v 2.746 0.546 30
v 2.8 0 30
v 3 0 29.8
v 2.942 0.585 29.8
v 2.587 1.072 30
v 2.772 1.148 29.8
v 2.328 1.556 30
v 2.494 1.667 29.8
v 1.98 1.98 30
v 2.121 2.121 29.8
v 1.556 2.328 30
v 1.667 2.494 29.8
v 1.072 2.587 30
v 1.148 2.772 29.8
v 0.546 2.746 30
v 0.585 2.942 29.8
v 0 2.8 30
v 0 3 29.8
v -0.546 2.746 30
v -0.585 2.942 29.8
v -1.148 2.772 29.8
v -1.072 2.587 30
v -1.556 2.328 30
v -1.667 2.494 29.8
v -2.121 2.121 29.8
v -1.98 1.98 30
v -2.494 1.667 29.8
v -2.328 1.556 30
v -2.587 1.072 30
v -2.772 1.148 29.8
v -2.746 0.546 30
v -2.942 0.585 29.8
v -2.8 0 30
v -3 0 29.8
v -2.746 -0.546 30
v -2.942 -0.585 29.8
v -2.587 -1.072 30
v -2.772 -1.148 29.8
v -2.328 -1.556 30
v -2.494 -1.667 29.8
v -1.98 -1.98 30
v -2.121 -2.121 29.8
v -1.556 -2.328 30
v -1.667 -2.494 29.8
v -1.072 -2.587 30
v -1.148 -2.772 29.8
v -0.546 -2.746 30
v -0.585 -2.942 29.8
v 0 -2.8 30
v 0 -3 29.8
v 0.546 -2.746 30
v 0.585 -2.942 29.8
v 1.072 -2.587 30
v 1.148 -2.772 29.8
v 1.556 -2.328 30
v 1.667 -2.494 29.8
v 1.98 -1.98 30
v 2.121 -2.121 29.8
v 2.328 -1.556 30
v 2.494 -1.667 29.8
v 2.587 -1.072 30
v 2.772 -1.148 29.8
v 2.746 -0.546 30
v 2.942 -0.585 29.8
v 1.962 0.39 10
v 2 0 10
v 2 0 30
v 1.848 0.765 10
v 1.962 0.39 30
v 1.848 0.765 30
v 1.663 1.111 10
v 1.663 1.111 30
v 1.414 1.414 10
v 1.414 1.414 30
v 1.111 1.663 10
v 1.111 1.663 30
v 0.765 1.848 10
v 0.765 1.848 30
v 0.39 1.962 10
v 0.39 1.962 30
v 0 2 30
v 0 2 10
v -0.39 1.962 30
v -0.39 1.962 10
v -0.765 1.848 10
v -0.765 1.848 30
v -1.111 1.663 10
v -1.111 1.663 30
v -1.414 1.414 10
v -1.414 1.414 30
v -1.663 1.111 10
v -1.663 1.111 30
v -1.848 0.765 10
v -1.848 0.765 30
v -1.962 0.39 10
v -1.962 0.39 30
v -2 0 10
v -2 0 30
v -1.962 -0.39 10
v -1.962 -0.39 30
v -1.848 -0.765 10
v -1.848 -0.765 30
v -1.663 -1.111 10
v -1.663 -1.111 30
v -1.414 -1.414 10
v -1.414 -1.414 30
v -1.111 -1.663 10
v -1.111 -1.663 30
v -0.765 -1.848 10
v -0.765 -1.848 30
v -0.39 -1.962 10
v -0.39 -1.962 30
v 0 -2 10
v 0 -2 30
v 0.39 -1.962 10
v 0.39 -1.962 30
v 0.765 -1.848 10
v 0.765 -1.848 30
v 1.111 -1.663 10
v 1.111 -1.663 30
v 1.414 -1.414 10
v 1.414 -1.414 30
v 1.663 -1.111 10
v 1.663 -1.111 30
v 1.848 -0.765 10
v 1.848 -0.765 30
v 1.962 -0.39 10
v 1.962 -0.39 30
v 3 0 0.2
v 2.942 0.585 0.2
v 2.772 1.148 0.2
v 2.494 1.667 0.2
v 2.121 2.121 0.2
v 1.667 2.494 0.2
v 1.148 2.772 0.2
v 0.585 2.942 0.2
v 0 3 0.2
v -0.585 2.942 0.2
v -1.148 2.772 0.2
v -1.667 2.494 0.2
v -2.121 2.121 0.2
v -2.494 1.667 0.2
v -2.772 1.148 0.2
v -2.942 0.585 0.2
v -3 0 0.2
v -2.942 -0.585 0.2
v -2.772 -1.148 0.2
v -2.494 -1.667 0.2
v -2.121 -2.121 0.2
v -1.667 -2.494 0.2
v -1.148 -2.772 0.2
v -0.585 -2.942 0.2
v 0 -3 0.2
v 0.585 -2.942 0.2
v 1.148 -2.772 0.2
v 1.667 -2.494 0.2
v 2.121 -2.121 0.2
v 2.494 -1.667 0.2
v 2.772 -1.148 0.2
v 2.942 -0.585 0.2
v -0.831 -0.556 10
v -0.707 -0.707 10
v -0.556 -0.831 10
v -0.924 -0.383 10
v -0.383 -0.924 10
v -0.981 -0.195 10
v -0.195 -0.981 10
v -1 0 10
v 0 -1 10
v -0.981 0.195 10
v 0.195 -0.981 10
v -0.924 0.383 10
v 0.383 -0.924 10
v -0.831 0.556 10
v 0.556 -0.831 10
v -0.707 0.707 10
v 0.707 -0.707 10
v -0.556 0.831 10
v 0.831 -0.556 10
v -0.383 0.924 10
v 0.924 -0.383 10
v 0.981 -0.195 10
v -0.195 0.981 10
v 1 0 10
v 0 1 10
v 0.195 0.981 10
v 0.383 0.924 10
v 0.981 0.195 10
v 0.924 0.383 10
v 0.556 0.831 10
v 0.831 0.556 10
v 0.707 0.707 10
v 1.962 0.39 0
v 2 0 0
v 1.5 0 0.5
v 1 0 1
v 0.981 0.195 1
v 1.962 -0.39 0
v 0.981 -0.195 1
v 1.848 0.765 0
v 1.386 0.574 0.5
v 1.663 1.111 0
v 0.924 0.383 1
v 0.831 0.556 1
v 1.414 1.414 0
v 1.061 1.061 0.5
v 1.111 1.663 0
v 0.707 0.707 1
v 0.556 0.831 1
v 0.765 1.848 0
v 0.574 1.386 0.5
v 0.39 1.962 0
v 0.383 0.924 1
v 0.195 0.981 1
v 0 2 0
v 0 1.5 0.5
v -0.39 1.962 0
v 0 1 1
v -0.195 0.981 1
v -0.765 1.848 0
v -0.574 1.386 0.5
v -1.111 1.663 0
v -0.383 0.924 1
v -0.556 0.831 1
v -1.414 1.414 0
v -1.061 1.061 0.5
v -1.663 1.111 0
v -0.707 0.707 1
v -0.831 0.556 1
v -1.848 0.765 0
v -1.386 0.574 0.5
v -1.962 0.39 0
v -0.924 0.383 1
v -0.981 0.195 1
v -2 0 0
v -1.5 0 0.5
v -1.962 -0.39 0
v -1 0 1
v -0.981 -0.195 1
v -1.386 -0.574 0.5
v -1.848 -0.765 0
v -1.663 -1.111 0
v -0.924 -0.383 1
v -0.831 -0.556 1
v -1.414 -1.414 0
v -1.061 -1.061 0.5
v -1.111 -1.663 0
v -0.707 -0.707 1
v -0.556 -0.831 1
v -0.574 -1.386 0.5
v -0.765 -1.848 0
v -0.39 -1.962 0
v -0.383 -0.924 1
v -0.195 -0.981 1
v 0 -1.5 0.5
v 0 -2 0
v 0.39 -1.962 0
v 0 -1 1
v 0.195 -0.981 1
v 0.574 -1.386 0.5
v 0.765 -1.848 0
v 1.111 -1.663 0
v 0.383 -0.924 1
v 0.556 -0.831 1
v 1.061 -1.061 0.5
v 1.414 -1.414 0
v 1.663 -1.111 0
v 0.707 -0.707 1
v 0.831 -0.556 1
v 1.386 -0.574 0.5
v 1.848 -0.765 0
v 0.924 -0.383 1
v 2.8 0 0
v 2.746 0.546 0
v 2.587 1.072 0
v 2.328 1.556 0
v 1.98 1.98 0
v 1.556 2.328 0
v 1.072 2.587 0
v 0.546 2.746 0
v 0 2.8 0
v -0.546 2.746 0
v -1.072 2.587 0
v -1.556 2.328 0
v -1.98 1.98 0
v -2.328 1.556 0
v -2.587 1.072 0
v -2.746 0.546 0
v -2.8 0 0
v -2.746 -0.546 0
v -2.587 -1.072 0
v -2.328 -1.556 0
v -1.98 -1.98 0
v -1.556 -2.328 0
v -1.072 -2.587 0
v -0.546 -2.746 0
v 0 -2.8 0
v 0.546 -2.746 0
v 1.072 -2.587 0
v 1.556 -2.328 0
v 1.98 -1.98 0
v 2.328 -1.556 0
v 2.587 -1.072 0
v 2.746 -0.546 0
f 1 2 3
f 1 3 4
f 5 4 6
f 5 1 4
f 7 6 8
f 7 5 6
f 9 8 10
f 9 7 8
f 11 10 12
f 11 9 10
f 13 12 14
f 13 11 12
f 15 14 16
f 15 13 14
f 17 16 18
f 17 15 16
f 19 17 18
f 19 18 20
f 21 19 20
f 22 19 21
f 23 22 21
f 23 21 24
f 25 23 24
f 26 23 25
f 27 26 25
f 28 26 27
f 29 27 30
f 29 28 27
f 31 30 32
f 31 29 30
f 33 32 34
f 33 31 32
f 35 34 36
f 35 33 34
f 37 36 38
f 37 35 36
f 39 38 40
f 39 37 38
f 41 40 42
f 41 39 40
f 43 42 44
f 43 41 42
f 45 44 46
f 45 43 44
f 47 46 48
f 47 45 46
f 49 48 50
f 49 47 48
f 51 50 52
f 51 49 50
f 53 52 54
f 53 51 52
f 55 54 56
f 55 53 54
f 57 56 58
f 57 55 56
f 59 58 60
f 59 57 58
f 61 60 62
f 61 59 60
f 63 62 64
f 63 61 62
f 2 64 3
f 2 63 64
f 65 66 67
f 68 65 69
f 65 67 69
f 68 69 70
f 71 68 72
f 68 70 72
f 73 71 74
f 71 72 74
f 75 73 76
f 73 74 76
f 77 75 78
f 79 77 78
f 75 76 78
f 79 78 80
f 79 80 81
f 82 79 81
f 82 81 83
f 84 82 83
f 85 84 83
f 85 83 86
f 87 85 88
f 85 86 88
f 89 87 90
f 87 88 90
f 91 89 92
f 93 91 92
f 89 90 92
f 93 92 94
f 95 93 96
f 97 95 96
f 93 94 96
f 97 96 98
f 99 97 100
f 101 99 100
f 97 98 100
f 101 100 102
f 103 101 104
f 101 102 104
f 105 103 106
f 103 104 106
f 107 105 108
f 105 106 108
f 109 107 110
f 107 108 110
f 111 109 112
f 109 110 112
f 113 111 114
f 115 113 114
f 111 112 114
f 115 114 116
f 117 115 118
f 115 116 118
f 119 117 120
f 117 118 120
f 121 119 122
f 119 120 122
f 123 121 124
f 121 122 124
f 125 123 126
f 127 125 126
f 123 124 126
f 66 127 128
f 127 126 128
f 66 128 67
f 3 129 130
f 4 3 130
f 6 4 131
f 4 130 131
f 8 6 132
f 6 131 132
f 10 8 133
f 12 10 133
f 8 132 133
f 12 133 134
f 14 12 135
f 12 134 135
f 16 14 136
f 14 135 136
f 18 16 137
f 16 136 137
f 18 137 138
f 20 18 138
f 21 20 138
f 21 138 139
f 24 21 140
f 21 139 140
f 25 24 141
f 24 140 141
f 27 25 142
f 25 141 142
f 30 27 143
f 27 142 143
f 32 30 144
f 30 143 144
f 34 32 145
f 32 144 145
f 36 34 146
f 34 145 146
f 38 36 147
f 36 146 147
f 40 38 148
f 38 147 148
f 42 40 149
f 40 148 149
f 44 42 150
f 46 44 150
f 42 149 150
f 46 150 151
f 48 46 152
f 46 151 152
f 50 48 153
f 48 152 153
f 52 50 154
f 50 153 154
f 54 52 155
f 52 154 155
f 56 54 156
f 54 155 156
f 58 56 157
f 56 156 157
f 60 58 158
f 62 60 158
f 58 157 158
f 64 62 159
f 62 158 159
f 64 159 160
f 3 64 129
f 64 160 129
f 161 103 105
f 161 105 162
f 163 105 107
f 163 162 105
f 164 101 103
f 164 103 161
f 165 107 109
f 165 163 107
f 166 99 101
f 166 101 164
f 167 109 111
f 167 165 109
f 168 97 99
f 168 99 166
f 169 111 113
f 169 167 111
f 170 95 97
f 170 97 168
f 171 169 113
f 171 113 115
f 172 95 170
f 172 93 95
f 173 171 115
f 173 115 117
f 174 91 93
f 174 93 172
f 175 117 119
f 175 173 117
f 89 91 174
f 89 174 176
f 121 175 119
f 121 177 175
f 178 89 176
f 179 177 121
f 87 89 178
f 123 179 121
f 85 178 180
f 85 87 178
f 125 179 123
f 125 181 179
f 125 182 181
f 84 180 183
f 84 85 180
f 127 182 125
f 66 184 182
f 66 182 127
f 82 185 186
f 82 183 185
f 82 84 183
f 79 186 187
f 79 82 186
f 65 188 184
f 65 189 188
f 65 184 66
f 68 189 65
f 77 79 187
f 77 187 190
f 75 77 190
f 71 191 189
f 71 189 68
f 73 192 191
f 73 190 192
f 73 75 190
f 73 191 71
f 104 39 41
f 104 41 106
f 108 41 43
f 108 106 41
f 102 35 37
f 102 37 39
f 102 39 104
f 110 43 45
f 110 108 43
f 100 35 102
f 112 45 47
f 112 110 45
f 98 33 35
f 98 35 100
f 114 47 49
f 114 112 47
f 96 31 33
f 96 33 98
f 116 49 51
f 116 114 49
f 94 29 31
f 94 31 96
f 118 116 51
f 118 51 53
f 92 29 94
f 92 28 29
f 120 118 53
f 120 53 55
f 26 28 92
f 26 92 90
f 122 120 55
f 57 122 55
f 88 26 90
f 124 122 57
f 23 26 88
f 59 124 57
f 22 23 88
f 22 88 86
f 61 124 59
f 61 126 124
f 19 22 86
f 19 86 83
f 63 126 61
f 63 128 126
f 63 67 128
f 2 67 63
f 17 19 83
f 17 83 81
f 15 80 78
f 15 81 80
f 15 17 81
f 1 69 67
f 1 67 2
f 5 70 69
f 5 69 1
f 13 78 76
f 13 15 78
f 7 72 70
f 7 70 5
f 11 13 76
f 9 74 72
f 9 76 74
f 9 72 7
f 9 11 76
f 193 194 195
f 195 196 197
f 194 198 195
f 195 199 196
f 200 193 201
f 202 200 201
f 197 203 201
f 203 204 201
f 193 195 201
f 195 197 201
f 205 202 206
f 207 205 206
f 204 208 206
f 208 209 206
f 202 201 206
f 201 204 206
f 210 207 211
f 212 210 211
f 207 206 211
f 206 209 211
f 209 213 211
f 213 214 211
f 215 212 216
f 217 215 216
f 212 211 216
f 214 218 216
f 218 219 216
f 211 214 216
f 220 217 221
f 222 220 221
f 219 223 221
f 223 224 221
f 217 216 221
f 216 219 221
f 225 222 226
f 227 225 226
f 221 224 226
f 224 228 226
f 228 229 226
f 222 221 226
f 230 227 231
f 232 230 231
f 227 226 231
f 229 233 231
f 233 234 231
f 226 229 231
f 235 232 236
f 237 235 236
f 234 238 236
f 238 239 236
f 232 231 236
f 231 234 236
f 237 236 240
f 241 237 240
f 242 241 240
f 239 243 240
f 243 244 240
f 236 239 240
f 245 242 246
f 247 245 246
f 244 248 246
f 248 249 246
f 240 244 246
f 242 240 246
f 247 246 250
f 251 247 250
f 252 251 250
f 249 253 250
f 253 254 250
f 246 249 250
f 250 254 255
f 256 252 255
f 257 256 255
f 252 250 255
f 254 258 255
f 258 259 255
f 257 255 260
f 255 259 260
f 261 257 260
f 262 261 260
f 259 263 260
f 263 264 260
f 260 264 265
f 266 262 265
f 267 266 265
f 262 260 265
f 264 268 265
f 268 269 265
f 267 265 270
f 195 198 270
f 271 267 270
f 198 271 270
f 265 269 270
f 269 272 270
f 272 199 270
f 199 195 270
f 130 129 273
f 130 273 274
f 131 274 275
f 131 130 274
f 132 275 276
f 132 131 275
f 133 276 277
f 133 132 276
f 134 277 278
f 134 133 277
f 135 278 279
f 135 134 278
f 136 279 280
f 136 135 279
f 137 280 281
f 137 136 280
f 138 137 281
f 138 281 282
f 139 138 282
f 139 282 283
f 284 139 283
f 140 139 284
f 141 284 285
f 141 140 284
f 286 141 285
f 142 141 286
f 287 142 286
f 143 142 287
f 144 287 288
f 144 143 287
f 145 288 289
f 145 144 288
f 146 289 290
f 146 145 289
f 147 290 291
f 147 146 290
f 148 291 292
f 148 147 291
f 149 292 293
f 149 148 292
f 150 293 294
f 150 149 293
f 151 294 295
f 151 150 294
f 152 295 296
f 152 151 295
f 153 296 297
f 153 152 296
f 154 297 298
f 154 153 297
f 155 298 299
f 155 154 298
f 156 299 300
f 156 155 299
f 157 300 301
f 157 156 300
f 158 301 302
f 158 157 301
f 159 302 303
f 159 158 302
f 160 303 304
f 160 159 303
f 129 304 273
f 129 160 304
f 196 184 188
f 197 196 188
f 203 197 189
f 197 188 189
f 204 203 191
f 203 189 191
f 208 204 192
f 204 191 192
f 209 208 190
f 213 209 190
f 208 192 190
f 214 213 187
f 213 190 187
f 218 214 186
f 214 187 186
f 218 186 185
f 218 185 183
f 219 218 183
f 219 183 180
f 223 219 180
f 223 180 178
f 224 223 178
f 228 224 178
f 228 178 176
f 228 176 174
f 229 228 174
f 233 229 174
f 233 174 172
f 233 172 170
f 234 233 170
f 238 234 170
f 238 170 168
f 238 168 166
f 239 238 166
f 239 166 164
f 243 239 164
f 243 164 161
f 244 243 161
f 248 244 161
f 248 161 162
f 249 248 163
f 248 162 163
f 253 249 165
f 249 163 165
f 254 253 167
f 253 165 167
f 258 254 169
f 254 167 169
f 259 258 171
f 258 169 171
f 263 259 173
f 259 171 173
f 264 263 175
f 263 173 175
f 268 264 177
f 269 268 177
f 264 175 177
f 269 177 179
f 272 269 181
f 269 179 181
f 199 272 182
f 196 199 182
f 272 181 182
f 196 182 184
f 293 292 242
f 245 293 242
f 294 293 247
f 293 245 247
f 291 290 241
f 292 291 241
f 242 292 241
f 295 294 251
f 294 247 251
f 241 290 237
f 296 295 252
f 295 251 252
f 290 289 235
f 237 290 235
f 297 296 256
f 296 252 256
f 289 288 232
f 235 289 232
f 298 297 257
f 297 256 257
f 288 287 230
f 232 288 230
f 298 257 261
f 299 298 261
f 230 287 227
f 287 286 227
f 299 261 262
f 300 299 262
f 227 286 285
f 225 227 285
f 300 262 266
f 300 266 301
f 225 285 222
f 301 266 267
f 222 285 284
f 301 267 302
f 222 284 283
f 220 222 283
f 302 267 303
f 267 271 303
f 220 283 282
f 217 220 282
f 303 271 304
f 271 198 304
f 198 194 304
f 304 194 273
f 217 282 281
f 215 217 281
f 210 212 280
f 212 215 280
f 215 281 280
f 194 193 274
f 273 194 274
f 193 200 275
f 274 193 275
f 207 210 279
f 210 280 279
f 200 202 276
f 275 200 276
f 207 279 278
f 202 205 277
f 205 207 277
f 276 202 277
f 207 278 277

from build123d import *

# Parameters (mm, degrees)
SKETCH_1_R          = 3
EXTRUDE_1_DEPTH     = 30
SKETCH_2_R          = 1
CUT_EXTRUDE_1_DEPTH = 30
SKETCH_3_R          = 2
CUT_EXTRUDE_2_DEPTH = 20
CHAMFER_1_SIZE      = 1
CHAMFER_2_SIZE      = 0.2


with BuildPart() as part:
    # Эскиз1 → Бобышка-Вытянуть1 (new body)
    with BuildSketch(Plane.XY):
        Circle(SKETCH_1_R)
    extrude(amount=EXTRUDE_1_DEPTH)

    # Эскиз2 → Вырез-Вытянуть1 (cut)
    with BuildSketch(Plane.XY.offset(30)):
        Circle(SKETCH_2_R)
    extrude(amount=-CUT_EXTRUDE_1_DEPTH, mode=Mode.SUBTRACT)

    # Эскиз3 → Вырез-Вытянуть2 (cut)
    with BuildSketch(Plane.XY.offset(30)):
        Circle(SKETCH_3_R)
    extrude(amount=-CUT_EXTRUDE_2_DEPTH, mode=Mode.SUBTRACT)

    # Фаска1
    chamfer_1_edges = [part.edges().sort_by_distance(p)[0] for p in [
        (-1, 0, 0),
    ]]
    chamfer(chamfer_1_edges, length=CHAMFER_1_SIZE)

    # Фаска2
    chamfer_2_edges = [part.edges().sort_by_distance(p)[0] for p in [
        (-3, 0, 0),
        (-3, 0, 30),
    ]]
    chamfer(chamfer_2_edges, length=CHAMFER_2_SIZE)


solid = part.part
